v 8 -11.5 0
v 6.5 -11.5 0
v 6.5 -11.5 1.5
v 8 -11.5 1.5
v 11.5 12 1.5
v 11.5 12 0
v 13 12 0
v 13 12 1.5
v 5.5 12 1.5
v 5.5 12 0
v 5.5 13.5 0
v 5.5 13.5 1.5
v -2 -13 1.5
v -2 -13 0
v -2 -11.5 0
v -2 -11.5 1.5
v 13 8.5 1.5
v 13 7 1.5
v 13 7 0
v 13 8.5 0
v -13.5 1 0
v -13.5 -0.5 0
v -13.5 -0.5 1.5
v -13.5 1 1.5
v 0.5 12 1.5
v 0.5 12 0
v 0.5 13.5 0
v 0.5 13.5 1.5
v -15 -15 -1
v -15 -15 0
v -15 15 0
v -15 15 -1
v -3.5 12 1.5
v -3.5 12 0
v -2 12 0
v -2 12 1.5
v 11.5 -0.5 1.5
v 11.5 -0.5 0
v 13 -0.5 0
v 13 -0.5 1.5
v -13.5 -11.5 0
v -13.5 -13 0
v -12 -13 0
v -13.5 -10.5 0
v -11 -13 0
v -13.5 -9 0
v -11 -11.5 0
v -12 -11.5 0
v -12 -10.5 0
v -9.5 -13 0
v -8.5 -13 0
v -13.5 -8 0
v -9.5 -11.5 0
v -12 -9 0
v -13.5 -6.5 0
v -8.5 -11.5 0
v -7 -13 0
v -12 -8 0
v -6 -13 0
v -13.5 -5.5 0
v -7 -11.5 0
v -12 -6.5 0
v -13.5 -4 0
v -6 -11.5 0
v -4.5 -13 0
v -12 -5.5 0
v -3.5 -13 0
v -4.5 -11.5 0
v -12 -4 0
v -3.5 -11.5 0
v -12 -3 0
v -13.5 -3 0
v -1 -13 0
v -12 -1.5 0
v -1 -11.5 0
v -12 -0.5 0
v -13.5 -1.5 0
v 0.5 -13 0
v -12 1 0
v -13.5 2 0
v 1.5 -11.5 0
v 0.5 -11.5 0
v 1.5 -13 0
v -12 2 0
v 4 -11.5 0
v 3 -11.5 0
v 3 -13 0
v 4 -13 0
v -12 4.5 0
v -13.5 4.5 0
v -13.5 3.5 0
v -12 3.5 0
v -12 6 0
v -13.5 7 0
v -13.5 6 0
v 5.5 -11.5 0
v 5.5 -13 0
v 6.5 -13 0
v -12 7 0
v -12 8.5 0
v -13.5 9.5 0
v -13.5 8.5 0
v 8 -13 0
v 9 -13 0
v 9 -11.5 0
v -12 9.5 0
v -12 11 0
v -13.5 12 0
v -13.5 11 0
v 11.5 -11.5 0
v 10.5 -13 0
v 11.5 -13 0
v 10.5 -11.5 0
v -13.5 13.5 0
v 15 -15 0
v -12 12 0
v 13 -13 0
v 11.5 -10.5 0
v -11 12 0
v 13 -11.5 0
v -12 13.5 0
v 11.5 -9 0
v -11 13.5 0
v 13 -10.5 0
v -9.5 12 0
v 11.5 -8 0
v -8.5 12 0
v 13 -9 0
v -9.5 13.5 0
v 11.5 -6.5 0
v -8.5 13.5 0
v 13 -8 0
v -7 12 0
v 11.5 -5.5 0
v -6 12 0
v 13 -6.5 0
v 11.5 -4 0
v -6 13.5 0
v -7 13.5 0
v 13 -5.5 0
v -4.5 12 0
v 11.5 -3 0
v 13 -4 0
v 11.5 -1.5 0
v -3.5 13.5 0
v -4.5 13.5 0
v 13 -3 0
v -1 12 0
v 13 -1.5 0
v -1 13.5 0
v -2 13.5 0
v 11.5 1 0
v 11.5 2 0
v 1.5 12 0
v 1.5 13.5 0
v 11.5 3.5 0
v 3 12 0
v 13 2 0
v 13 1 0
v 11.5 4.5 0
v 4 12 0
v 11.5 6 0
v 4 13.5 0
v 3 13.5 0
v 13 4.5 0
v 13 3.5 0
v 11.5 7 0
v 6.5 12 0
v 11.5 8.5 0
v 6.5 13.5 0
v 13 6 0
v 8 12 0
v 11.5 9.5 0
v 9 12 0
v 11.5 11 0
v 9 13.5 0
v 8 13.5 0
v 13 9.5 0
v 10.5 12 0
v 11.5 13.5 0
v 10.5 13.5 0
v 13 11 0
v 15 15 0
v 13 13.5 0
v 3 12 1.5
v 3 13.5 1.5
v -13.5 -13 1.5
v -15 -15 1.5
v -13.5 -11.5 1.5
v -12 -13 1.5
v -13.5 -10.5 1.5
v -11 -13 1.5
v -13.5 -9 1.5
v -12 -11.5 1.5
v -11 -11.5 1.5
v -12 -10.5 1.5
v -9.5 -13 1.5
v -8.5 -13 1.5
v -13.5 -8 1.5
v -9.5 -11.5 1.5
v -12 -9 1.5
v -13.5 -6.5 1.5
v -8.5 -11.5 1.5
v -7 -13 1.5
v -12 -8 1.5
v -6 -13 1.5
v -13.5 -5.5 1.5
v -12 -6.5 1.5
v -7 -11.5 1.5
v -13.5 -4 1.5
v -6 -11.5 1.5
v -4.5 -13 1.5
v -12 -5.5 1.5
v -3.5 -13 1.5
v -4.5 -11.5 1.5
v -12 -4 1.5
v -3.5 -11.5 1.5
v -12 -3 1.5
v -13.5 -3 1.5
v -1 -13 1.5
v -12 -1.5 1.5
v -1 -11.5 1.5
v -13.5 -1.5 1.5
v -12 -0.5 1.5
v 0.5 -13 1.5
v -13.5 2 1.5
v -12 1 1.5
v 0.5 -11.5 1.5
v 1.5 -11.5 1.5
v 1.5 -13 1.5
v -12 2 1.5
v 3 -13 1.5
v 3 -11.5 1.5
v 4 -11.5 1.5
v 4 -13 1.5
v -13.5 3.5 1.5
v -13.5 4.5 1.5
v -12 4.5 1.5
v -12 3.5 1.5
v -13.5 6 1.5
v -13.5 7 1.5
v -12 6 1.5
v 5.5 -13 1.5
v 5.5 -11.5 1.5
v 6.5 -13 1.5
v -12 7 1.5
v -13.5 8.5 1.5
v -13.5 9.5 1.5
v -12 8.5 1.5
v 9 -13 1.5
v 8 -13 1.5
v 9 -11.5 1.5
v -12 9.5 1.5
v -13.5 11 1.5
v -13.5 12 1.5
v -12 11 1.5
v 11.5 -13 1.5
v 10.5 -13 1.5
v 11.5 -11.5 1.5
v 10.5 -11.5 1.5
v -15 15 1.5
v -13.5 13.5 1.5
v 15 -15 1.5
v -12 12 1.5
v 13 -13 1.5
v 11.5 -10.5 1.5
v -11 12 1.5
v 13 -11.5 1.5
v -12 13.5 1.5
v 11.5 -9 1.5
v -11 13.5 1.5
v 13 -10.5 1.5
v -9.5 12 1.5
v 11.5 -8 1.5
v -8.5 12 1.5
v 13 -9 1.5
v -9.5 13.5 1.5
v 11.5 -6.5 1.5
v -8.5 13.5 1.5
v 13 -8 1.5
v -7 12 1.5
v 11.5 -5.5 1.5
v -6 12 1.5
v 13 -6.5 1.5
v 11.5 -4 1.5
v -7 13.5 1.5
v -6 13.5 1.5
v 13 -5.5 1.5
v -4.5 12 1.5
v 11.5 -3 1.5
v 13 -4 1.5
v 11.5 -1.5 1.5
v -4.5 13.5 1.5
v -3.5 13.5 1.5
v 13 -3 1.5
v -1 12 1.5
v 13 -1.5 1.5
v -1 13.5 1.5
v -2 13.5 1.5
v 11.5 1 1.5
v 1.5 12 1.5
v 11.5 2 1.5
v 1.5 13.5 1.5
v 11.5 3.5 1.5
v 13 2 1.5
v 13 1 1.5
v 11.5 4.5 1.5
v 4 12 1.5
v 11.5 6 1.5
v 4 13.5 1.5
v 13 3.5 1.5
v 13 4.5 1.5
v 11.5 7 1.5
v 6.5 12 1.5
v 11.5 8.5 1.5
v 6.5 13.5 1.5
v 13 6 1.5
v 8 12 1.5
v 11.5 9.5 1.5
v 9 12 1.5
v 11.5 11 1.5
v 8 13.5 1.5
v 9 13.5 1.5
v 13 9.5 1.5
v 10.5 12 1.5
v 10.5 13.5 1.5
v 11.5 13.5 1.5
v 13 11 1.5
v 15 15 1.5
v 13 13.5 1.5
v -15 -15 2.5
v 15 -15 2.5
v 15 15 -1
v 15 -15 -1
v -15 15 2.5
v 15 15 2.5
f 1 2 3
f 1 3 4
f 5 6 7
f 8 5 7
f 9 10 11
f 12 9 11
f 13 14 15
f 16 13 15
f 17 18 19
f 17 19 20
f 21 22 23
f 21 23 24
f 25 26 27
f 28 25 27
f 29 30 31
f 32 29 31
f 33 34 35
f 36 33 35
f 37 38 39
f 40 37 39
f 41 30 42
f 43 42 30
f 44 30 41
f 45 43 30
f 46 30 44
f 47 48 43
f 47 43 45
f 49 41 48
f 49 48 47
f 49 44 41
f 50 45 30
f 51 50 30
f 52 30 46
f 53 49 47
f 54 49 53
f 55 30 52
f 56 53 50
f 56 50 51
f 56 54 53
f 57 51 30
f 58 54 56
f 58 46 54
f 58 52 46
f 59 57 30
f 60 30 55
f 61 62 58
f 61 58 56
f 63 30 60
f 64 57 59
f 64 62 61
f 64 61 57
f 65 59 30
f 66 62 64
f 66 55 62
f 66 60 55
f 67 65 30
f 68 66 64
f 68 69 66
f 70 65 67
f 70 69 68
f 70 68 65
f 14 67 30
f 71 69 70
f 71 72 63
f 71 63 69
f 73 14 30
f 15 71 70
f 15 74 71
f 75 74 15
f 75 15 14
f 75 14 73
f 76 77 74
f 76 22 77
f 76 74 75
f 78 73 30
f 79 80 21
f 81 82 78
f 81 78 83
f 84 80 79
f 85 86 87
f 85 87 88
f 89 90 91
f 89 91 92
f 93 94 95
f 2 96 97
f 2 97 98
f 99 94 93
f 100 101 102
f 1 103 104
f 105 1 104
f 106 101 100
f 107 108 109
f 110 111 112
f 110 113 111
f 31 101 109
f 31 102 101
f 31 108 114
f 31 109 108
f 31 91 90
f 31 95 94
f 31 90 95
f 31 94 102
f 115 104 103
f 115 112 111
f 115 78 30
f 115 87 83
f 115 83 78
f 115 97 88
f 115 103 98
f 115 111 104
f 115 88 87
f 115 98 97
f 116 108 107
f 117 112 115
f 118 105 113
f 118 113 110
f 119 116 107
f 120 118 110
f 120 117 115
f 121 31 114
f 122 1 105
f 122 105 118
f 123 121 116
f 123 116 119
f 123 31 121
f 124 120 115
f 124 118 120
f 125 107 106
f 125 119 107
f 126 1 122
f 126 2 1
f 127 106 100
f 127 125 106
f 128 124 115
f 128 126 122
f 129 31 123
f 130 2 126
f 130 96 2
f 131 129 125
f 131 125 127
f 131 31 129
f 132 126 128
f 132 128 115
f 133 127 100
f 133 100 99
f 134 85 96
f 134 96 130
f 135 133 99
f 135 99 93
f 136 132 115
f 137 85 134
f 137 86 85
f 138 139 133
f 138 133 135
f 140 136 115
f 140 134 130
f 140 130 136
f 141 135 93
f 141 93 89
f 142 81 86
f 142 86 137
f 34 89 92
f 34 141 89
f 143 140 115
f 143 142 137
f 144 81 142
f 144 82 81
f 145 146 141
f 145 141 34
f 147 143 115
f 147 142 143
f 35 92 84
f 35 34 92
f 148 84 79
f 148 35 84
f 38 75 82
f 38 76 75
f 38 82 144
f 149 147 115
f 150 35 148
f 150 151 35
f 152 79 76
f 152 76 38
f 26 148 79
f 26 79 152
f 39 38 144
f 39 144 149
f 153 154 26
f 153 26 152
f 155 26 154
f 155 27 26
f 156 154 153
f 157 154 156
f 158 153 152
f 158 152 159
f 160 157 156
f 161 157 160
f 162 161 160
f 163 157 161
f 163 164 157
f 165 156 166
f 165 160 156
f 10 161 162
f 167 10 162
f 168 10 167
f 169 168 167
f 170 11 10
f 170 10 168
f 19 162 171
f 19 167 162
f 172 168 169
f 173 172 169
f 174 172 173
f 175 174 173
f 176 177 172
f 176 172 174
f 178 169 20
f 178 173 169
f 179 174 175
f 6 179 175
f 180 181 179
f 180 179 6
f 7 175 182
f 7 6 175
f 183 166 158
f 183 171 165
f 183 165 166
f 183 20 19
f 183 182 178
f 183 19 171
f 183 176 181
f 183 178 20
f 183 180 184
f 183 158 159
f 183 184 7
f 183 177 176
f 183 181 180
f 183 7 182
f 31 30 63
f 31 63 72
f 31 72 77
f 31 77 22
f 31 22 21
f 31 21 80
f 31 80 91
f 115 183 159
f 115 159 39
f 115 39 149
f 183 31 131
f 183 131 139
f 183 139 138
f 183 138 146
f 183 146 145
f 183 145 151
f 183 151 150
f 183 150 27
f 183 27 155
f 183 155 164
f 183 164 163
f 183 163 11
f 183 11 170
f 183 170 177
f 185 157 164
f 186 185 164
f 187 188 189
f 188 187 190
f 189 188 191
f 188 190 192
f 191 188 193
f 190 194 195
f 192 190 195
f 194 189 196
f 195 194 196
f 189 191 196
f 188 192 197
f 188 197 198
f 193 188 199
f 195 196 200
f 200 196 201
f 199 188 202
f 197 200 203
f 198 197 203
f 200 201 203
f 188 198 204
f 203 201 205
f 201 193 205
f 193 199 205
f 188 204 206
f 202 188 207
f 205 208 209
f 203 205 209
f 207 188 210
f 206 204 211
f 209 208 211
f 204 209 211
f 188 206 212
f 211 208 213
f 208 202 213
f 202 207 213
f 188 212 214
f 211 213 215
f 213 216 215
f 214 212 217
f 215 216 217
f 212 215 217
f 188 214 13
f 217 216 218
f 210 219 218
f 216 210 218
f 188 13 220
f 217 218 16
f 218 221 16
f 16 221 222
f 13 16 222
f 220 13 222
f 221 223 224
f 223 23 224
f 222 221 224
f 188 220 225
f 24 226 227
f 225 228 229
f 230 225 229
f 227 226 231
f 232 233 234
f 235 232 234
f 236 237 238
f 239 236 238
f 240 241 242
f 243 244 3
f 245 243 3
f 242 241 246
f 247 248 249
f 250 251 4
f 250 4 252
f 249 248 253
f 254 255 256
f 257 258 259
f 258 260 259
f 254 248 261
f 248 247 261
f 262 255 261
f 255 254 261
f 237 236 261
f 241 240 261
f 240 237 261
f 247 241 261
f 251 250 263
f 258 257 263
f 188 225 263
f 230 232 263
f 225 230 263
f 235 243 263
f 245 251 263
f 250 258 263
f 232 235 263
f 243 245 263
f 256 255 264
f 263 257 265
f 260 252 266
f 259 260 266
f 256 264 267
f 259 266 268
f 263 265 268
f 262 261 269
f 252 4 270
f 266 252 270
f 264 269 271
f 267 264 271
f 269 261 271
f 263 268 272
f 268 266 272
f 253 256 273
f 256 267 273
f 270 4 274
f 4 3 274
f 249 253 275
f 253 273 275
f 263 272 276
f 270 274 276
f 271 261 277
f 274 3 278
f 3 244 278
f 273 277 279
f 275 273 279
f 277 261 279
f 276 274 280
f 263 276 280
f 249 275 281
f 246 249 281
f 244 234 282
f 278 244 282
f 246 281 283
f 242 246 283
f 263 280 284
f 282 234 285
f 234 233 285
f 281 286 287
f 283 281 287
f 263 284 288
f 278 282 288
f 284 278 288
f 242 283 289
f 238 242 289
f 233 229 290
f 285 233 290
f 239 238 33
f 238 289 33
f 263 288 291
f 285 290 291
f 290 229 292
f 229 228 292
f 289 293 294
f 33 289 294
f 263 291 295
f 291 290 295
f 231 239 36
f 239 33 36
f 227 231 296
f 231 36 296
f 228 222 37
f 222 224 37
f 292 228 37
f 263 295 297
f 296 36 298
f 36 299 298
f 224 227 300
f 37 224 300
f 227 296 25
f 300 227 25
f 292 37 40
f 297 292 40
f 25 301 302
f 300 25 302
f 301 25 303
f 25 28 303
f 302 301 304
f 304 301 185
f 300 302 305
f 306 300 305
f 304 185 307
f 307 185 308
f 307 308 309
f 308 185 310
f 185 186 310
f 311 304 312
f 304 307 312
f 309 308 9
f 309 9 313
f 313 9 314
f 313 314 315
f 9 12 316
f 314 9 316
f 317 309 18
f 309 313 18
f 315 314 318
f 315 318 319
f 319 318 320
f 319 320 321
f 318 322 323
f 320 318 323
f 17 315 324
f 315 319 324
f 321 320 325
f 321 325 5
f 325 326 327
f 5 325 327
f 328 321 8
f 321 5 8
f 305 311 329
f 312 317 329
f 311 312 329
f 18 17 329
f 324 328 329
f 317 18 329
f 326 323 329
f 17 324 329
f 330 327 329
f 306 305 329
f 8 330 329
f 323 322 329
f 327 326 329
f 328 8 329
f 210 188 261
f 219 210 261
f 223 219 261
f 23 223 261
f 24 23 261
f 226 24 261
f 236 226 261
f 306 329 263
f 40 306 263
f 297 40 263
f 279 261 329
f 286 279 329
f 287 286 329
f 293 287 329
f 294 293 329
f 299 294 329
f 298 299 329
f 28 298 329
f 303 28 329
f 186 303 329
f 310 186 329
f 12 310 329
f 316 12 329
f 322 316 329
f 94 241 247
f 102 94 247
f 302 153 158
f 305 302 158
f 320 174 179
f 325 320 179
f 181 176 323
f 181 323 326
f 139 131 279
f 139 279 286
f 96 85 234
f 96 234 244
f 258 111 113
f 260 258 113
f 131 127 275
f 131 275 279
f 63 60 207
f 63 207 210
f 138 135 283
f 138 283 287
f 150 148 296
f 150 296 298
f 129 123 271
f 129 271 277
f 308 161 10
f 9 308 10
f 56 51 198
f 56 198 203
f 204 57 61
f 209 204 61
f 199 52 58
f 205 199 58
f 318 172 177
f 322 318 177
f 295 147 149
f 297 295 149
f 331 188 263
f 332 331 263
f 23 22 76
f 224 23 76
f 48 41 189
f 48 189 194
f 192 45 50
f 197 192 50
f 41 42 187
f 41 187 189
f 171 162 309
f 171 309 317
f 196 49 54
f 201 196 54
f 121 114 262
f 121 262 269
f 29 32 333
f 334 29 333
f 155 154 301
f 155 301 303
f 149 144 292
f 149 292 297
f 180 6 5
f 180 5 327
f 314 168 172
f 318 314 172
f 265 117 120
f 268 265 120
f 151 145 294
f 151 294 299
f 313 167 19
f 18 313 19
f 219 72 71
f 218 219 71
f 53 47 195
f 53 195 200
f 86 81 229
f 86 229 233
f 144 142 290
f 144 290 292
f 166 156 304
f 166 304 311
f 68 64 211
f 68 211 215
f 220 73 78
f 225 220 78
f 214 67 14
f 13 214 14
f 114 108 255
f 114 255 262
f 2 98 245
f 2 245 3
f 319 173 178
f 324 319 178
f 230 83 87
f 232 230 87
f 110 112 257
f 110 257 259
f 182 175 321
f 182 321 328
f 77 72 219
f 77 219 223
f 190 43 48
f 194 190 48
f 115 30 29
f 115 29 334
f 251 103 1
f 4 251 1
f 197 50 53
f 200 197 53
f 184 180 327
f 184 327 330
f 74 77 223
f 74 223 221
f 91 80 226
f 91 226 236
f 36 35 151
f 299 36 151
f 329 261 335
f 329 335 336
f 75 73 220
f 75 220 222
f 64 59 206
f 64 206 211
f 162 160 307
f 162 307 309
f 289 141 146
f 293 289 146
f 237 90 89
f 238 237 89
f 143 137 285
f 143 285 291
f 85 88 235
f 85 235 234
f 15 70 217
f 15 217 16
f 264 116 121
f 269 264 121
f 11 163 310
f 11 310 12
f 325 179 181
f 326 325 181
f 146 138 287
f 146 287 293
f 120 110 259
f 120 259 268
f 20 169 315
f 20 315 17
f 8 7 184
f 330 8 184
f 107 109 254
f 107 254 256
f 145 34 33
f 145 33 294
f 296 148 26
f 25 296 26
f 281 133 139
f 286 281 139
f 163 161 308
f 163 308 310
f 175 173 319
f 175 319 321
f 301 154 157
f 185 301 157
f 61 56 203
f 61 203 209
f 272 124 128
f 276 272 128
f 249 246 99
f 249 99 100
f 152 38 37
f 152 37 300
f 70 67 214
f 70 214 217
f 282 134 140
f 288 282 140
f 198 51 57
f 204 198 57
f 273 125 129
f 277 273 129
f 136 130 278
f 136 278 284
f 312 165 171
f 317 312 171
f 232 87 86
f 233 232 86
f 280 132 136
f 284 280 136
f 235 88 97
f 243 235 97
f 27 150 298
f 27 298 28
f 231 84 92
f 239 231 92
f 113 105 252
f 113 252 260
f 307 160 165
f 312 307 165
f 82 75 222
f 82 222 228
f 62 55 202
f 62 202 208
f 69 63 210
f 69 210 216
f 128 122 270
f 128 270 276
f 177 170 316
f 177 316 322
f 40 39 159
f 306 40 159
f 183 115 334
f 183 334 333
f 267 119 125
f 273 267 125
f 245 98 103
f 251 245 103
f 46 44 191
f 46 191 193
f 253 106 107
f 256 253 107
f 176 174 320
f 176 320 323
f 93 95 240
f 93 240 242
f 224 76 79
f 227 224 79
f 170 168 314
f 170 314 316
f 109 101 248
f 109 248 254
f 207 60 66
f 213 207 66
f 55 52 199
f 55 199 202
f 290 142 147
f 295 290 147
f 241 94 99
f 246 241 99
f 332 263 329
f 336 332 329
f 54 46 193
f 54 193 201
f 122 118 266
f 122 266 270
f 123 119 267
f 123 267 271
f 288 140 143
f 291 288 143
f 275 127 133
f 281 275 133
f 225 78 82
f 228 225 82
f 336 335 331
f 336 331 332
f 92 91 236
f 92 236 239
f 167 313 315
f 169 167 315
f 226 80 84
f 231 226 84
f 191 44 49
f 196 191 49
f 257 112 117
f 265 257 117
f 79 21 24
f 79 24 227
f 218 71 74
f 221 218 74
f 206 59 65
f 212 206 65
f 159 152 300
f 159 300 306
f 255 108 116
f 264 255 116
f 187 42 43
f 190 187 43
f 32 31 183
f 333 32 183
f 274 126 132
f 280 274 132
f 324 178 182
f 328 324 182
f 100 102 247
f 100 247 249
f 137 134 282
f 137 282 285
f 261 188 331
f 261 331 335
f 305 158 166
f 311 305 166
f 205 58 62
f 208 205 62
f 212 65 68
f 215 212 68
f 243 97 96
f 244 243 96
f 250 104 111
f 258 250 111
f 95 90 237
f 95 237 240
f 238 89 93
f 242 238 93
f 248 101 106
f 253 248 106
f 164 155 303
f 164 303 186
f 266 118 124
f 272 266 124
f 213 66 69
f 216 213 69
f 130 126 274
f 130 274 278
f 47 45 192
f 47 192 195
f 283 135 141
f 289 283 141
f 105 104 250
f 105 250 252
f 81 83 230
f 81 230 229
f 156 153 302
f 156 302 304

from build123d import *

# Parameters (mm, degrees)
F0_W     = 30
F0_H     = 30
F1_DEPTH = 1
F2_W     = 1.5
F2_H     = 1.4999990595
F3_DEPTH = 1.5
F4_W     = 30
F4_H     = 30
F5_DEPTH = 1


with BuildPart() as f1:
    # F0 (on Top) → F1 (new body)
    with BuildSketch(Plane.XY):
        Rectangle(F0_W, F0_H)
    extrude(amount=-F1_DEPTH)

    # F2 (on face) → F3 (join)
    with BuildSketch(Plane.XY):
        with Locations((-12.75, 12.7500004702)):
            Rectangle(F2_W, F2_H)
        with Locations((-10.25, 12.7500004702)):
            Rectangle(F2_W, F2_H)
        with Locations((-7.75, 12.7500004702)):
            Rectangle(F2_W, F2_H)
        with Locations((-5.25, 12.7500004702)):
            Rectangle(F2_W, F2_H)
        with Locations((-2.75, 12.7500004702)):
            Rectangle(F2_W, F2_H)
        with Locations((-0.25, 12.7500004702)):
            Rectangle(F2_W, F2_H)
        with Locations((2.25, 12.7500004702)):
            Rectangle(F2_W, F2_H)
        with Locations((4.75, 12.7500004702)):
            Rectangle(F2_W, F2_H)
        with Locations((7.25, 12.7500004702)):
            Rectangle(F2_W, F2_H)
        with Locations((9.75, 12.7500004702)):
            Rectangle(F2_W, F2_H)
        with Locations((12.25, 12.7500004702)):
            Rectangle(F2_W, F2_H)
        with Locations((12.25, 10.2500004702)):
            Rectangle(F2_W, F2_H)
        with Locations((-12.75, 10.2500004702)):
            Rectangle(F2_W, F2_H)
        with Locations((12.25, 7.7500004702)):
            Rectangle(F2_W, F2_H)
        with Locations((-12.75, 7.7500004702)):
            Rectangle(F2_W, F2_H)
        with Locations((12.25, 5.2500004702)):
            Rectangle(F2_W, F2_H)
        with Locations((-12.75, 5.2500004702)):
            Rectangle(F2_W, F2_H)
        with Locations((12.25, 2.7500004702)):
            Rectangle(F2_W, F2_H)
        with Locations((-12.75, 2.7500004702)):
            Rectangle(F2_W, F2_H)
        with Locations((12.25, 0.2500004702)):
            Rectangle(F2_W, F2_H)
        with Locations((-12.75, 0.2500004702)):
            Rectangle(F2_W, F2_H)
        with Locations((12.25, -2.2499995298)):
            Rectangle(F2_W, F2_H)
        with Locations((-12.75, -2.2499995298)):
            Rectangle(F2_W, F2_H)
        with Locations((12.25, -4.7499995298)):
            Rectangle(F2_W, F2_H)
        with Locations((-12.75, -4.7499995298)):
            Rectangle(F2_W, F2_H)
        with Locations((12.25, -7.2499995298)):
            Rectangle(F2_W, F2_H)
        with Locations((-12.75, -7.2499995298)):
            Rectangle(F2_W, F2_H)
        with Locations((12.25, -9.7499995298)):
            Rectangle(F2_W, F2_H)
        with Locations((-12.75, -9.7499995298)):
            Rectangle(F2_W, F2_H)
        with Locations((-0.25, -12.2499995298)):
            Rectangle(F2_W, F2_H)
        with Locations((9.75, -12.2499995298)):
            Rectangle(F2_W, F2_H)
        with Locations((-5.25, -12.2499995298)):
            Rectangle(F2_W, F2_H)
        with Locations((-10.25, -12.2499995298)):
            Rectangle(F2_W, F2_H)
        with Locations((4.75, -12.2499995298)):
            Rectangle(F2_W, F2_H)
        with Locations((-2.75, -12.2499995298)):
            Rectangle(F2_W, F2_H)
        with Locations((7.25, -12.2499995298)):
            Rectangle(F2_W, F2_H)
        with Locations((2.25, -12.2499995298)):
            Rectangle(F2_W, F2_H)
        with Locations((12.25, -12.2499995298)):
            Rectangle(F2_W, F2_H)
        with Locations((-7.75, -12.2499995298)):
            Rectangle(F2_W, F2_H)
        with Locations((-12.75, -12.2499995298)):
            Rectangle(F2_W, F2_H)
    extrude(amount=F3_DEPTH)

    # F4 (on face) → F5 (join)
    with BuildSketch(Plane.XY.offset(1.5)):
        Rectangle(F4_W, F4_H)
    extrude(amount=F5_DEPTH)


solid = f1.part
